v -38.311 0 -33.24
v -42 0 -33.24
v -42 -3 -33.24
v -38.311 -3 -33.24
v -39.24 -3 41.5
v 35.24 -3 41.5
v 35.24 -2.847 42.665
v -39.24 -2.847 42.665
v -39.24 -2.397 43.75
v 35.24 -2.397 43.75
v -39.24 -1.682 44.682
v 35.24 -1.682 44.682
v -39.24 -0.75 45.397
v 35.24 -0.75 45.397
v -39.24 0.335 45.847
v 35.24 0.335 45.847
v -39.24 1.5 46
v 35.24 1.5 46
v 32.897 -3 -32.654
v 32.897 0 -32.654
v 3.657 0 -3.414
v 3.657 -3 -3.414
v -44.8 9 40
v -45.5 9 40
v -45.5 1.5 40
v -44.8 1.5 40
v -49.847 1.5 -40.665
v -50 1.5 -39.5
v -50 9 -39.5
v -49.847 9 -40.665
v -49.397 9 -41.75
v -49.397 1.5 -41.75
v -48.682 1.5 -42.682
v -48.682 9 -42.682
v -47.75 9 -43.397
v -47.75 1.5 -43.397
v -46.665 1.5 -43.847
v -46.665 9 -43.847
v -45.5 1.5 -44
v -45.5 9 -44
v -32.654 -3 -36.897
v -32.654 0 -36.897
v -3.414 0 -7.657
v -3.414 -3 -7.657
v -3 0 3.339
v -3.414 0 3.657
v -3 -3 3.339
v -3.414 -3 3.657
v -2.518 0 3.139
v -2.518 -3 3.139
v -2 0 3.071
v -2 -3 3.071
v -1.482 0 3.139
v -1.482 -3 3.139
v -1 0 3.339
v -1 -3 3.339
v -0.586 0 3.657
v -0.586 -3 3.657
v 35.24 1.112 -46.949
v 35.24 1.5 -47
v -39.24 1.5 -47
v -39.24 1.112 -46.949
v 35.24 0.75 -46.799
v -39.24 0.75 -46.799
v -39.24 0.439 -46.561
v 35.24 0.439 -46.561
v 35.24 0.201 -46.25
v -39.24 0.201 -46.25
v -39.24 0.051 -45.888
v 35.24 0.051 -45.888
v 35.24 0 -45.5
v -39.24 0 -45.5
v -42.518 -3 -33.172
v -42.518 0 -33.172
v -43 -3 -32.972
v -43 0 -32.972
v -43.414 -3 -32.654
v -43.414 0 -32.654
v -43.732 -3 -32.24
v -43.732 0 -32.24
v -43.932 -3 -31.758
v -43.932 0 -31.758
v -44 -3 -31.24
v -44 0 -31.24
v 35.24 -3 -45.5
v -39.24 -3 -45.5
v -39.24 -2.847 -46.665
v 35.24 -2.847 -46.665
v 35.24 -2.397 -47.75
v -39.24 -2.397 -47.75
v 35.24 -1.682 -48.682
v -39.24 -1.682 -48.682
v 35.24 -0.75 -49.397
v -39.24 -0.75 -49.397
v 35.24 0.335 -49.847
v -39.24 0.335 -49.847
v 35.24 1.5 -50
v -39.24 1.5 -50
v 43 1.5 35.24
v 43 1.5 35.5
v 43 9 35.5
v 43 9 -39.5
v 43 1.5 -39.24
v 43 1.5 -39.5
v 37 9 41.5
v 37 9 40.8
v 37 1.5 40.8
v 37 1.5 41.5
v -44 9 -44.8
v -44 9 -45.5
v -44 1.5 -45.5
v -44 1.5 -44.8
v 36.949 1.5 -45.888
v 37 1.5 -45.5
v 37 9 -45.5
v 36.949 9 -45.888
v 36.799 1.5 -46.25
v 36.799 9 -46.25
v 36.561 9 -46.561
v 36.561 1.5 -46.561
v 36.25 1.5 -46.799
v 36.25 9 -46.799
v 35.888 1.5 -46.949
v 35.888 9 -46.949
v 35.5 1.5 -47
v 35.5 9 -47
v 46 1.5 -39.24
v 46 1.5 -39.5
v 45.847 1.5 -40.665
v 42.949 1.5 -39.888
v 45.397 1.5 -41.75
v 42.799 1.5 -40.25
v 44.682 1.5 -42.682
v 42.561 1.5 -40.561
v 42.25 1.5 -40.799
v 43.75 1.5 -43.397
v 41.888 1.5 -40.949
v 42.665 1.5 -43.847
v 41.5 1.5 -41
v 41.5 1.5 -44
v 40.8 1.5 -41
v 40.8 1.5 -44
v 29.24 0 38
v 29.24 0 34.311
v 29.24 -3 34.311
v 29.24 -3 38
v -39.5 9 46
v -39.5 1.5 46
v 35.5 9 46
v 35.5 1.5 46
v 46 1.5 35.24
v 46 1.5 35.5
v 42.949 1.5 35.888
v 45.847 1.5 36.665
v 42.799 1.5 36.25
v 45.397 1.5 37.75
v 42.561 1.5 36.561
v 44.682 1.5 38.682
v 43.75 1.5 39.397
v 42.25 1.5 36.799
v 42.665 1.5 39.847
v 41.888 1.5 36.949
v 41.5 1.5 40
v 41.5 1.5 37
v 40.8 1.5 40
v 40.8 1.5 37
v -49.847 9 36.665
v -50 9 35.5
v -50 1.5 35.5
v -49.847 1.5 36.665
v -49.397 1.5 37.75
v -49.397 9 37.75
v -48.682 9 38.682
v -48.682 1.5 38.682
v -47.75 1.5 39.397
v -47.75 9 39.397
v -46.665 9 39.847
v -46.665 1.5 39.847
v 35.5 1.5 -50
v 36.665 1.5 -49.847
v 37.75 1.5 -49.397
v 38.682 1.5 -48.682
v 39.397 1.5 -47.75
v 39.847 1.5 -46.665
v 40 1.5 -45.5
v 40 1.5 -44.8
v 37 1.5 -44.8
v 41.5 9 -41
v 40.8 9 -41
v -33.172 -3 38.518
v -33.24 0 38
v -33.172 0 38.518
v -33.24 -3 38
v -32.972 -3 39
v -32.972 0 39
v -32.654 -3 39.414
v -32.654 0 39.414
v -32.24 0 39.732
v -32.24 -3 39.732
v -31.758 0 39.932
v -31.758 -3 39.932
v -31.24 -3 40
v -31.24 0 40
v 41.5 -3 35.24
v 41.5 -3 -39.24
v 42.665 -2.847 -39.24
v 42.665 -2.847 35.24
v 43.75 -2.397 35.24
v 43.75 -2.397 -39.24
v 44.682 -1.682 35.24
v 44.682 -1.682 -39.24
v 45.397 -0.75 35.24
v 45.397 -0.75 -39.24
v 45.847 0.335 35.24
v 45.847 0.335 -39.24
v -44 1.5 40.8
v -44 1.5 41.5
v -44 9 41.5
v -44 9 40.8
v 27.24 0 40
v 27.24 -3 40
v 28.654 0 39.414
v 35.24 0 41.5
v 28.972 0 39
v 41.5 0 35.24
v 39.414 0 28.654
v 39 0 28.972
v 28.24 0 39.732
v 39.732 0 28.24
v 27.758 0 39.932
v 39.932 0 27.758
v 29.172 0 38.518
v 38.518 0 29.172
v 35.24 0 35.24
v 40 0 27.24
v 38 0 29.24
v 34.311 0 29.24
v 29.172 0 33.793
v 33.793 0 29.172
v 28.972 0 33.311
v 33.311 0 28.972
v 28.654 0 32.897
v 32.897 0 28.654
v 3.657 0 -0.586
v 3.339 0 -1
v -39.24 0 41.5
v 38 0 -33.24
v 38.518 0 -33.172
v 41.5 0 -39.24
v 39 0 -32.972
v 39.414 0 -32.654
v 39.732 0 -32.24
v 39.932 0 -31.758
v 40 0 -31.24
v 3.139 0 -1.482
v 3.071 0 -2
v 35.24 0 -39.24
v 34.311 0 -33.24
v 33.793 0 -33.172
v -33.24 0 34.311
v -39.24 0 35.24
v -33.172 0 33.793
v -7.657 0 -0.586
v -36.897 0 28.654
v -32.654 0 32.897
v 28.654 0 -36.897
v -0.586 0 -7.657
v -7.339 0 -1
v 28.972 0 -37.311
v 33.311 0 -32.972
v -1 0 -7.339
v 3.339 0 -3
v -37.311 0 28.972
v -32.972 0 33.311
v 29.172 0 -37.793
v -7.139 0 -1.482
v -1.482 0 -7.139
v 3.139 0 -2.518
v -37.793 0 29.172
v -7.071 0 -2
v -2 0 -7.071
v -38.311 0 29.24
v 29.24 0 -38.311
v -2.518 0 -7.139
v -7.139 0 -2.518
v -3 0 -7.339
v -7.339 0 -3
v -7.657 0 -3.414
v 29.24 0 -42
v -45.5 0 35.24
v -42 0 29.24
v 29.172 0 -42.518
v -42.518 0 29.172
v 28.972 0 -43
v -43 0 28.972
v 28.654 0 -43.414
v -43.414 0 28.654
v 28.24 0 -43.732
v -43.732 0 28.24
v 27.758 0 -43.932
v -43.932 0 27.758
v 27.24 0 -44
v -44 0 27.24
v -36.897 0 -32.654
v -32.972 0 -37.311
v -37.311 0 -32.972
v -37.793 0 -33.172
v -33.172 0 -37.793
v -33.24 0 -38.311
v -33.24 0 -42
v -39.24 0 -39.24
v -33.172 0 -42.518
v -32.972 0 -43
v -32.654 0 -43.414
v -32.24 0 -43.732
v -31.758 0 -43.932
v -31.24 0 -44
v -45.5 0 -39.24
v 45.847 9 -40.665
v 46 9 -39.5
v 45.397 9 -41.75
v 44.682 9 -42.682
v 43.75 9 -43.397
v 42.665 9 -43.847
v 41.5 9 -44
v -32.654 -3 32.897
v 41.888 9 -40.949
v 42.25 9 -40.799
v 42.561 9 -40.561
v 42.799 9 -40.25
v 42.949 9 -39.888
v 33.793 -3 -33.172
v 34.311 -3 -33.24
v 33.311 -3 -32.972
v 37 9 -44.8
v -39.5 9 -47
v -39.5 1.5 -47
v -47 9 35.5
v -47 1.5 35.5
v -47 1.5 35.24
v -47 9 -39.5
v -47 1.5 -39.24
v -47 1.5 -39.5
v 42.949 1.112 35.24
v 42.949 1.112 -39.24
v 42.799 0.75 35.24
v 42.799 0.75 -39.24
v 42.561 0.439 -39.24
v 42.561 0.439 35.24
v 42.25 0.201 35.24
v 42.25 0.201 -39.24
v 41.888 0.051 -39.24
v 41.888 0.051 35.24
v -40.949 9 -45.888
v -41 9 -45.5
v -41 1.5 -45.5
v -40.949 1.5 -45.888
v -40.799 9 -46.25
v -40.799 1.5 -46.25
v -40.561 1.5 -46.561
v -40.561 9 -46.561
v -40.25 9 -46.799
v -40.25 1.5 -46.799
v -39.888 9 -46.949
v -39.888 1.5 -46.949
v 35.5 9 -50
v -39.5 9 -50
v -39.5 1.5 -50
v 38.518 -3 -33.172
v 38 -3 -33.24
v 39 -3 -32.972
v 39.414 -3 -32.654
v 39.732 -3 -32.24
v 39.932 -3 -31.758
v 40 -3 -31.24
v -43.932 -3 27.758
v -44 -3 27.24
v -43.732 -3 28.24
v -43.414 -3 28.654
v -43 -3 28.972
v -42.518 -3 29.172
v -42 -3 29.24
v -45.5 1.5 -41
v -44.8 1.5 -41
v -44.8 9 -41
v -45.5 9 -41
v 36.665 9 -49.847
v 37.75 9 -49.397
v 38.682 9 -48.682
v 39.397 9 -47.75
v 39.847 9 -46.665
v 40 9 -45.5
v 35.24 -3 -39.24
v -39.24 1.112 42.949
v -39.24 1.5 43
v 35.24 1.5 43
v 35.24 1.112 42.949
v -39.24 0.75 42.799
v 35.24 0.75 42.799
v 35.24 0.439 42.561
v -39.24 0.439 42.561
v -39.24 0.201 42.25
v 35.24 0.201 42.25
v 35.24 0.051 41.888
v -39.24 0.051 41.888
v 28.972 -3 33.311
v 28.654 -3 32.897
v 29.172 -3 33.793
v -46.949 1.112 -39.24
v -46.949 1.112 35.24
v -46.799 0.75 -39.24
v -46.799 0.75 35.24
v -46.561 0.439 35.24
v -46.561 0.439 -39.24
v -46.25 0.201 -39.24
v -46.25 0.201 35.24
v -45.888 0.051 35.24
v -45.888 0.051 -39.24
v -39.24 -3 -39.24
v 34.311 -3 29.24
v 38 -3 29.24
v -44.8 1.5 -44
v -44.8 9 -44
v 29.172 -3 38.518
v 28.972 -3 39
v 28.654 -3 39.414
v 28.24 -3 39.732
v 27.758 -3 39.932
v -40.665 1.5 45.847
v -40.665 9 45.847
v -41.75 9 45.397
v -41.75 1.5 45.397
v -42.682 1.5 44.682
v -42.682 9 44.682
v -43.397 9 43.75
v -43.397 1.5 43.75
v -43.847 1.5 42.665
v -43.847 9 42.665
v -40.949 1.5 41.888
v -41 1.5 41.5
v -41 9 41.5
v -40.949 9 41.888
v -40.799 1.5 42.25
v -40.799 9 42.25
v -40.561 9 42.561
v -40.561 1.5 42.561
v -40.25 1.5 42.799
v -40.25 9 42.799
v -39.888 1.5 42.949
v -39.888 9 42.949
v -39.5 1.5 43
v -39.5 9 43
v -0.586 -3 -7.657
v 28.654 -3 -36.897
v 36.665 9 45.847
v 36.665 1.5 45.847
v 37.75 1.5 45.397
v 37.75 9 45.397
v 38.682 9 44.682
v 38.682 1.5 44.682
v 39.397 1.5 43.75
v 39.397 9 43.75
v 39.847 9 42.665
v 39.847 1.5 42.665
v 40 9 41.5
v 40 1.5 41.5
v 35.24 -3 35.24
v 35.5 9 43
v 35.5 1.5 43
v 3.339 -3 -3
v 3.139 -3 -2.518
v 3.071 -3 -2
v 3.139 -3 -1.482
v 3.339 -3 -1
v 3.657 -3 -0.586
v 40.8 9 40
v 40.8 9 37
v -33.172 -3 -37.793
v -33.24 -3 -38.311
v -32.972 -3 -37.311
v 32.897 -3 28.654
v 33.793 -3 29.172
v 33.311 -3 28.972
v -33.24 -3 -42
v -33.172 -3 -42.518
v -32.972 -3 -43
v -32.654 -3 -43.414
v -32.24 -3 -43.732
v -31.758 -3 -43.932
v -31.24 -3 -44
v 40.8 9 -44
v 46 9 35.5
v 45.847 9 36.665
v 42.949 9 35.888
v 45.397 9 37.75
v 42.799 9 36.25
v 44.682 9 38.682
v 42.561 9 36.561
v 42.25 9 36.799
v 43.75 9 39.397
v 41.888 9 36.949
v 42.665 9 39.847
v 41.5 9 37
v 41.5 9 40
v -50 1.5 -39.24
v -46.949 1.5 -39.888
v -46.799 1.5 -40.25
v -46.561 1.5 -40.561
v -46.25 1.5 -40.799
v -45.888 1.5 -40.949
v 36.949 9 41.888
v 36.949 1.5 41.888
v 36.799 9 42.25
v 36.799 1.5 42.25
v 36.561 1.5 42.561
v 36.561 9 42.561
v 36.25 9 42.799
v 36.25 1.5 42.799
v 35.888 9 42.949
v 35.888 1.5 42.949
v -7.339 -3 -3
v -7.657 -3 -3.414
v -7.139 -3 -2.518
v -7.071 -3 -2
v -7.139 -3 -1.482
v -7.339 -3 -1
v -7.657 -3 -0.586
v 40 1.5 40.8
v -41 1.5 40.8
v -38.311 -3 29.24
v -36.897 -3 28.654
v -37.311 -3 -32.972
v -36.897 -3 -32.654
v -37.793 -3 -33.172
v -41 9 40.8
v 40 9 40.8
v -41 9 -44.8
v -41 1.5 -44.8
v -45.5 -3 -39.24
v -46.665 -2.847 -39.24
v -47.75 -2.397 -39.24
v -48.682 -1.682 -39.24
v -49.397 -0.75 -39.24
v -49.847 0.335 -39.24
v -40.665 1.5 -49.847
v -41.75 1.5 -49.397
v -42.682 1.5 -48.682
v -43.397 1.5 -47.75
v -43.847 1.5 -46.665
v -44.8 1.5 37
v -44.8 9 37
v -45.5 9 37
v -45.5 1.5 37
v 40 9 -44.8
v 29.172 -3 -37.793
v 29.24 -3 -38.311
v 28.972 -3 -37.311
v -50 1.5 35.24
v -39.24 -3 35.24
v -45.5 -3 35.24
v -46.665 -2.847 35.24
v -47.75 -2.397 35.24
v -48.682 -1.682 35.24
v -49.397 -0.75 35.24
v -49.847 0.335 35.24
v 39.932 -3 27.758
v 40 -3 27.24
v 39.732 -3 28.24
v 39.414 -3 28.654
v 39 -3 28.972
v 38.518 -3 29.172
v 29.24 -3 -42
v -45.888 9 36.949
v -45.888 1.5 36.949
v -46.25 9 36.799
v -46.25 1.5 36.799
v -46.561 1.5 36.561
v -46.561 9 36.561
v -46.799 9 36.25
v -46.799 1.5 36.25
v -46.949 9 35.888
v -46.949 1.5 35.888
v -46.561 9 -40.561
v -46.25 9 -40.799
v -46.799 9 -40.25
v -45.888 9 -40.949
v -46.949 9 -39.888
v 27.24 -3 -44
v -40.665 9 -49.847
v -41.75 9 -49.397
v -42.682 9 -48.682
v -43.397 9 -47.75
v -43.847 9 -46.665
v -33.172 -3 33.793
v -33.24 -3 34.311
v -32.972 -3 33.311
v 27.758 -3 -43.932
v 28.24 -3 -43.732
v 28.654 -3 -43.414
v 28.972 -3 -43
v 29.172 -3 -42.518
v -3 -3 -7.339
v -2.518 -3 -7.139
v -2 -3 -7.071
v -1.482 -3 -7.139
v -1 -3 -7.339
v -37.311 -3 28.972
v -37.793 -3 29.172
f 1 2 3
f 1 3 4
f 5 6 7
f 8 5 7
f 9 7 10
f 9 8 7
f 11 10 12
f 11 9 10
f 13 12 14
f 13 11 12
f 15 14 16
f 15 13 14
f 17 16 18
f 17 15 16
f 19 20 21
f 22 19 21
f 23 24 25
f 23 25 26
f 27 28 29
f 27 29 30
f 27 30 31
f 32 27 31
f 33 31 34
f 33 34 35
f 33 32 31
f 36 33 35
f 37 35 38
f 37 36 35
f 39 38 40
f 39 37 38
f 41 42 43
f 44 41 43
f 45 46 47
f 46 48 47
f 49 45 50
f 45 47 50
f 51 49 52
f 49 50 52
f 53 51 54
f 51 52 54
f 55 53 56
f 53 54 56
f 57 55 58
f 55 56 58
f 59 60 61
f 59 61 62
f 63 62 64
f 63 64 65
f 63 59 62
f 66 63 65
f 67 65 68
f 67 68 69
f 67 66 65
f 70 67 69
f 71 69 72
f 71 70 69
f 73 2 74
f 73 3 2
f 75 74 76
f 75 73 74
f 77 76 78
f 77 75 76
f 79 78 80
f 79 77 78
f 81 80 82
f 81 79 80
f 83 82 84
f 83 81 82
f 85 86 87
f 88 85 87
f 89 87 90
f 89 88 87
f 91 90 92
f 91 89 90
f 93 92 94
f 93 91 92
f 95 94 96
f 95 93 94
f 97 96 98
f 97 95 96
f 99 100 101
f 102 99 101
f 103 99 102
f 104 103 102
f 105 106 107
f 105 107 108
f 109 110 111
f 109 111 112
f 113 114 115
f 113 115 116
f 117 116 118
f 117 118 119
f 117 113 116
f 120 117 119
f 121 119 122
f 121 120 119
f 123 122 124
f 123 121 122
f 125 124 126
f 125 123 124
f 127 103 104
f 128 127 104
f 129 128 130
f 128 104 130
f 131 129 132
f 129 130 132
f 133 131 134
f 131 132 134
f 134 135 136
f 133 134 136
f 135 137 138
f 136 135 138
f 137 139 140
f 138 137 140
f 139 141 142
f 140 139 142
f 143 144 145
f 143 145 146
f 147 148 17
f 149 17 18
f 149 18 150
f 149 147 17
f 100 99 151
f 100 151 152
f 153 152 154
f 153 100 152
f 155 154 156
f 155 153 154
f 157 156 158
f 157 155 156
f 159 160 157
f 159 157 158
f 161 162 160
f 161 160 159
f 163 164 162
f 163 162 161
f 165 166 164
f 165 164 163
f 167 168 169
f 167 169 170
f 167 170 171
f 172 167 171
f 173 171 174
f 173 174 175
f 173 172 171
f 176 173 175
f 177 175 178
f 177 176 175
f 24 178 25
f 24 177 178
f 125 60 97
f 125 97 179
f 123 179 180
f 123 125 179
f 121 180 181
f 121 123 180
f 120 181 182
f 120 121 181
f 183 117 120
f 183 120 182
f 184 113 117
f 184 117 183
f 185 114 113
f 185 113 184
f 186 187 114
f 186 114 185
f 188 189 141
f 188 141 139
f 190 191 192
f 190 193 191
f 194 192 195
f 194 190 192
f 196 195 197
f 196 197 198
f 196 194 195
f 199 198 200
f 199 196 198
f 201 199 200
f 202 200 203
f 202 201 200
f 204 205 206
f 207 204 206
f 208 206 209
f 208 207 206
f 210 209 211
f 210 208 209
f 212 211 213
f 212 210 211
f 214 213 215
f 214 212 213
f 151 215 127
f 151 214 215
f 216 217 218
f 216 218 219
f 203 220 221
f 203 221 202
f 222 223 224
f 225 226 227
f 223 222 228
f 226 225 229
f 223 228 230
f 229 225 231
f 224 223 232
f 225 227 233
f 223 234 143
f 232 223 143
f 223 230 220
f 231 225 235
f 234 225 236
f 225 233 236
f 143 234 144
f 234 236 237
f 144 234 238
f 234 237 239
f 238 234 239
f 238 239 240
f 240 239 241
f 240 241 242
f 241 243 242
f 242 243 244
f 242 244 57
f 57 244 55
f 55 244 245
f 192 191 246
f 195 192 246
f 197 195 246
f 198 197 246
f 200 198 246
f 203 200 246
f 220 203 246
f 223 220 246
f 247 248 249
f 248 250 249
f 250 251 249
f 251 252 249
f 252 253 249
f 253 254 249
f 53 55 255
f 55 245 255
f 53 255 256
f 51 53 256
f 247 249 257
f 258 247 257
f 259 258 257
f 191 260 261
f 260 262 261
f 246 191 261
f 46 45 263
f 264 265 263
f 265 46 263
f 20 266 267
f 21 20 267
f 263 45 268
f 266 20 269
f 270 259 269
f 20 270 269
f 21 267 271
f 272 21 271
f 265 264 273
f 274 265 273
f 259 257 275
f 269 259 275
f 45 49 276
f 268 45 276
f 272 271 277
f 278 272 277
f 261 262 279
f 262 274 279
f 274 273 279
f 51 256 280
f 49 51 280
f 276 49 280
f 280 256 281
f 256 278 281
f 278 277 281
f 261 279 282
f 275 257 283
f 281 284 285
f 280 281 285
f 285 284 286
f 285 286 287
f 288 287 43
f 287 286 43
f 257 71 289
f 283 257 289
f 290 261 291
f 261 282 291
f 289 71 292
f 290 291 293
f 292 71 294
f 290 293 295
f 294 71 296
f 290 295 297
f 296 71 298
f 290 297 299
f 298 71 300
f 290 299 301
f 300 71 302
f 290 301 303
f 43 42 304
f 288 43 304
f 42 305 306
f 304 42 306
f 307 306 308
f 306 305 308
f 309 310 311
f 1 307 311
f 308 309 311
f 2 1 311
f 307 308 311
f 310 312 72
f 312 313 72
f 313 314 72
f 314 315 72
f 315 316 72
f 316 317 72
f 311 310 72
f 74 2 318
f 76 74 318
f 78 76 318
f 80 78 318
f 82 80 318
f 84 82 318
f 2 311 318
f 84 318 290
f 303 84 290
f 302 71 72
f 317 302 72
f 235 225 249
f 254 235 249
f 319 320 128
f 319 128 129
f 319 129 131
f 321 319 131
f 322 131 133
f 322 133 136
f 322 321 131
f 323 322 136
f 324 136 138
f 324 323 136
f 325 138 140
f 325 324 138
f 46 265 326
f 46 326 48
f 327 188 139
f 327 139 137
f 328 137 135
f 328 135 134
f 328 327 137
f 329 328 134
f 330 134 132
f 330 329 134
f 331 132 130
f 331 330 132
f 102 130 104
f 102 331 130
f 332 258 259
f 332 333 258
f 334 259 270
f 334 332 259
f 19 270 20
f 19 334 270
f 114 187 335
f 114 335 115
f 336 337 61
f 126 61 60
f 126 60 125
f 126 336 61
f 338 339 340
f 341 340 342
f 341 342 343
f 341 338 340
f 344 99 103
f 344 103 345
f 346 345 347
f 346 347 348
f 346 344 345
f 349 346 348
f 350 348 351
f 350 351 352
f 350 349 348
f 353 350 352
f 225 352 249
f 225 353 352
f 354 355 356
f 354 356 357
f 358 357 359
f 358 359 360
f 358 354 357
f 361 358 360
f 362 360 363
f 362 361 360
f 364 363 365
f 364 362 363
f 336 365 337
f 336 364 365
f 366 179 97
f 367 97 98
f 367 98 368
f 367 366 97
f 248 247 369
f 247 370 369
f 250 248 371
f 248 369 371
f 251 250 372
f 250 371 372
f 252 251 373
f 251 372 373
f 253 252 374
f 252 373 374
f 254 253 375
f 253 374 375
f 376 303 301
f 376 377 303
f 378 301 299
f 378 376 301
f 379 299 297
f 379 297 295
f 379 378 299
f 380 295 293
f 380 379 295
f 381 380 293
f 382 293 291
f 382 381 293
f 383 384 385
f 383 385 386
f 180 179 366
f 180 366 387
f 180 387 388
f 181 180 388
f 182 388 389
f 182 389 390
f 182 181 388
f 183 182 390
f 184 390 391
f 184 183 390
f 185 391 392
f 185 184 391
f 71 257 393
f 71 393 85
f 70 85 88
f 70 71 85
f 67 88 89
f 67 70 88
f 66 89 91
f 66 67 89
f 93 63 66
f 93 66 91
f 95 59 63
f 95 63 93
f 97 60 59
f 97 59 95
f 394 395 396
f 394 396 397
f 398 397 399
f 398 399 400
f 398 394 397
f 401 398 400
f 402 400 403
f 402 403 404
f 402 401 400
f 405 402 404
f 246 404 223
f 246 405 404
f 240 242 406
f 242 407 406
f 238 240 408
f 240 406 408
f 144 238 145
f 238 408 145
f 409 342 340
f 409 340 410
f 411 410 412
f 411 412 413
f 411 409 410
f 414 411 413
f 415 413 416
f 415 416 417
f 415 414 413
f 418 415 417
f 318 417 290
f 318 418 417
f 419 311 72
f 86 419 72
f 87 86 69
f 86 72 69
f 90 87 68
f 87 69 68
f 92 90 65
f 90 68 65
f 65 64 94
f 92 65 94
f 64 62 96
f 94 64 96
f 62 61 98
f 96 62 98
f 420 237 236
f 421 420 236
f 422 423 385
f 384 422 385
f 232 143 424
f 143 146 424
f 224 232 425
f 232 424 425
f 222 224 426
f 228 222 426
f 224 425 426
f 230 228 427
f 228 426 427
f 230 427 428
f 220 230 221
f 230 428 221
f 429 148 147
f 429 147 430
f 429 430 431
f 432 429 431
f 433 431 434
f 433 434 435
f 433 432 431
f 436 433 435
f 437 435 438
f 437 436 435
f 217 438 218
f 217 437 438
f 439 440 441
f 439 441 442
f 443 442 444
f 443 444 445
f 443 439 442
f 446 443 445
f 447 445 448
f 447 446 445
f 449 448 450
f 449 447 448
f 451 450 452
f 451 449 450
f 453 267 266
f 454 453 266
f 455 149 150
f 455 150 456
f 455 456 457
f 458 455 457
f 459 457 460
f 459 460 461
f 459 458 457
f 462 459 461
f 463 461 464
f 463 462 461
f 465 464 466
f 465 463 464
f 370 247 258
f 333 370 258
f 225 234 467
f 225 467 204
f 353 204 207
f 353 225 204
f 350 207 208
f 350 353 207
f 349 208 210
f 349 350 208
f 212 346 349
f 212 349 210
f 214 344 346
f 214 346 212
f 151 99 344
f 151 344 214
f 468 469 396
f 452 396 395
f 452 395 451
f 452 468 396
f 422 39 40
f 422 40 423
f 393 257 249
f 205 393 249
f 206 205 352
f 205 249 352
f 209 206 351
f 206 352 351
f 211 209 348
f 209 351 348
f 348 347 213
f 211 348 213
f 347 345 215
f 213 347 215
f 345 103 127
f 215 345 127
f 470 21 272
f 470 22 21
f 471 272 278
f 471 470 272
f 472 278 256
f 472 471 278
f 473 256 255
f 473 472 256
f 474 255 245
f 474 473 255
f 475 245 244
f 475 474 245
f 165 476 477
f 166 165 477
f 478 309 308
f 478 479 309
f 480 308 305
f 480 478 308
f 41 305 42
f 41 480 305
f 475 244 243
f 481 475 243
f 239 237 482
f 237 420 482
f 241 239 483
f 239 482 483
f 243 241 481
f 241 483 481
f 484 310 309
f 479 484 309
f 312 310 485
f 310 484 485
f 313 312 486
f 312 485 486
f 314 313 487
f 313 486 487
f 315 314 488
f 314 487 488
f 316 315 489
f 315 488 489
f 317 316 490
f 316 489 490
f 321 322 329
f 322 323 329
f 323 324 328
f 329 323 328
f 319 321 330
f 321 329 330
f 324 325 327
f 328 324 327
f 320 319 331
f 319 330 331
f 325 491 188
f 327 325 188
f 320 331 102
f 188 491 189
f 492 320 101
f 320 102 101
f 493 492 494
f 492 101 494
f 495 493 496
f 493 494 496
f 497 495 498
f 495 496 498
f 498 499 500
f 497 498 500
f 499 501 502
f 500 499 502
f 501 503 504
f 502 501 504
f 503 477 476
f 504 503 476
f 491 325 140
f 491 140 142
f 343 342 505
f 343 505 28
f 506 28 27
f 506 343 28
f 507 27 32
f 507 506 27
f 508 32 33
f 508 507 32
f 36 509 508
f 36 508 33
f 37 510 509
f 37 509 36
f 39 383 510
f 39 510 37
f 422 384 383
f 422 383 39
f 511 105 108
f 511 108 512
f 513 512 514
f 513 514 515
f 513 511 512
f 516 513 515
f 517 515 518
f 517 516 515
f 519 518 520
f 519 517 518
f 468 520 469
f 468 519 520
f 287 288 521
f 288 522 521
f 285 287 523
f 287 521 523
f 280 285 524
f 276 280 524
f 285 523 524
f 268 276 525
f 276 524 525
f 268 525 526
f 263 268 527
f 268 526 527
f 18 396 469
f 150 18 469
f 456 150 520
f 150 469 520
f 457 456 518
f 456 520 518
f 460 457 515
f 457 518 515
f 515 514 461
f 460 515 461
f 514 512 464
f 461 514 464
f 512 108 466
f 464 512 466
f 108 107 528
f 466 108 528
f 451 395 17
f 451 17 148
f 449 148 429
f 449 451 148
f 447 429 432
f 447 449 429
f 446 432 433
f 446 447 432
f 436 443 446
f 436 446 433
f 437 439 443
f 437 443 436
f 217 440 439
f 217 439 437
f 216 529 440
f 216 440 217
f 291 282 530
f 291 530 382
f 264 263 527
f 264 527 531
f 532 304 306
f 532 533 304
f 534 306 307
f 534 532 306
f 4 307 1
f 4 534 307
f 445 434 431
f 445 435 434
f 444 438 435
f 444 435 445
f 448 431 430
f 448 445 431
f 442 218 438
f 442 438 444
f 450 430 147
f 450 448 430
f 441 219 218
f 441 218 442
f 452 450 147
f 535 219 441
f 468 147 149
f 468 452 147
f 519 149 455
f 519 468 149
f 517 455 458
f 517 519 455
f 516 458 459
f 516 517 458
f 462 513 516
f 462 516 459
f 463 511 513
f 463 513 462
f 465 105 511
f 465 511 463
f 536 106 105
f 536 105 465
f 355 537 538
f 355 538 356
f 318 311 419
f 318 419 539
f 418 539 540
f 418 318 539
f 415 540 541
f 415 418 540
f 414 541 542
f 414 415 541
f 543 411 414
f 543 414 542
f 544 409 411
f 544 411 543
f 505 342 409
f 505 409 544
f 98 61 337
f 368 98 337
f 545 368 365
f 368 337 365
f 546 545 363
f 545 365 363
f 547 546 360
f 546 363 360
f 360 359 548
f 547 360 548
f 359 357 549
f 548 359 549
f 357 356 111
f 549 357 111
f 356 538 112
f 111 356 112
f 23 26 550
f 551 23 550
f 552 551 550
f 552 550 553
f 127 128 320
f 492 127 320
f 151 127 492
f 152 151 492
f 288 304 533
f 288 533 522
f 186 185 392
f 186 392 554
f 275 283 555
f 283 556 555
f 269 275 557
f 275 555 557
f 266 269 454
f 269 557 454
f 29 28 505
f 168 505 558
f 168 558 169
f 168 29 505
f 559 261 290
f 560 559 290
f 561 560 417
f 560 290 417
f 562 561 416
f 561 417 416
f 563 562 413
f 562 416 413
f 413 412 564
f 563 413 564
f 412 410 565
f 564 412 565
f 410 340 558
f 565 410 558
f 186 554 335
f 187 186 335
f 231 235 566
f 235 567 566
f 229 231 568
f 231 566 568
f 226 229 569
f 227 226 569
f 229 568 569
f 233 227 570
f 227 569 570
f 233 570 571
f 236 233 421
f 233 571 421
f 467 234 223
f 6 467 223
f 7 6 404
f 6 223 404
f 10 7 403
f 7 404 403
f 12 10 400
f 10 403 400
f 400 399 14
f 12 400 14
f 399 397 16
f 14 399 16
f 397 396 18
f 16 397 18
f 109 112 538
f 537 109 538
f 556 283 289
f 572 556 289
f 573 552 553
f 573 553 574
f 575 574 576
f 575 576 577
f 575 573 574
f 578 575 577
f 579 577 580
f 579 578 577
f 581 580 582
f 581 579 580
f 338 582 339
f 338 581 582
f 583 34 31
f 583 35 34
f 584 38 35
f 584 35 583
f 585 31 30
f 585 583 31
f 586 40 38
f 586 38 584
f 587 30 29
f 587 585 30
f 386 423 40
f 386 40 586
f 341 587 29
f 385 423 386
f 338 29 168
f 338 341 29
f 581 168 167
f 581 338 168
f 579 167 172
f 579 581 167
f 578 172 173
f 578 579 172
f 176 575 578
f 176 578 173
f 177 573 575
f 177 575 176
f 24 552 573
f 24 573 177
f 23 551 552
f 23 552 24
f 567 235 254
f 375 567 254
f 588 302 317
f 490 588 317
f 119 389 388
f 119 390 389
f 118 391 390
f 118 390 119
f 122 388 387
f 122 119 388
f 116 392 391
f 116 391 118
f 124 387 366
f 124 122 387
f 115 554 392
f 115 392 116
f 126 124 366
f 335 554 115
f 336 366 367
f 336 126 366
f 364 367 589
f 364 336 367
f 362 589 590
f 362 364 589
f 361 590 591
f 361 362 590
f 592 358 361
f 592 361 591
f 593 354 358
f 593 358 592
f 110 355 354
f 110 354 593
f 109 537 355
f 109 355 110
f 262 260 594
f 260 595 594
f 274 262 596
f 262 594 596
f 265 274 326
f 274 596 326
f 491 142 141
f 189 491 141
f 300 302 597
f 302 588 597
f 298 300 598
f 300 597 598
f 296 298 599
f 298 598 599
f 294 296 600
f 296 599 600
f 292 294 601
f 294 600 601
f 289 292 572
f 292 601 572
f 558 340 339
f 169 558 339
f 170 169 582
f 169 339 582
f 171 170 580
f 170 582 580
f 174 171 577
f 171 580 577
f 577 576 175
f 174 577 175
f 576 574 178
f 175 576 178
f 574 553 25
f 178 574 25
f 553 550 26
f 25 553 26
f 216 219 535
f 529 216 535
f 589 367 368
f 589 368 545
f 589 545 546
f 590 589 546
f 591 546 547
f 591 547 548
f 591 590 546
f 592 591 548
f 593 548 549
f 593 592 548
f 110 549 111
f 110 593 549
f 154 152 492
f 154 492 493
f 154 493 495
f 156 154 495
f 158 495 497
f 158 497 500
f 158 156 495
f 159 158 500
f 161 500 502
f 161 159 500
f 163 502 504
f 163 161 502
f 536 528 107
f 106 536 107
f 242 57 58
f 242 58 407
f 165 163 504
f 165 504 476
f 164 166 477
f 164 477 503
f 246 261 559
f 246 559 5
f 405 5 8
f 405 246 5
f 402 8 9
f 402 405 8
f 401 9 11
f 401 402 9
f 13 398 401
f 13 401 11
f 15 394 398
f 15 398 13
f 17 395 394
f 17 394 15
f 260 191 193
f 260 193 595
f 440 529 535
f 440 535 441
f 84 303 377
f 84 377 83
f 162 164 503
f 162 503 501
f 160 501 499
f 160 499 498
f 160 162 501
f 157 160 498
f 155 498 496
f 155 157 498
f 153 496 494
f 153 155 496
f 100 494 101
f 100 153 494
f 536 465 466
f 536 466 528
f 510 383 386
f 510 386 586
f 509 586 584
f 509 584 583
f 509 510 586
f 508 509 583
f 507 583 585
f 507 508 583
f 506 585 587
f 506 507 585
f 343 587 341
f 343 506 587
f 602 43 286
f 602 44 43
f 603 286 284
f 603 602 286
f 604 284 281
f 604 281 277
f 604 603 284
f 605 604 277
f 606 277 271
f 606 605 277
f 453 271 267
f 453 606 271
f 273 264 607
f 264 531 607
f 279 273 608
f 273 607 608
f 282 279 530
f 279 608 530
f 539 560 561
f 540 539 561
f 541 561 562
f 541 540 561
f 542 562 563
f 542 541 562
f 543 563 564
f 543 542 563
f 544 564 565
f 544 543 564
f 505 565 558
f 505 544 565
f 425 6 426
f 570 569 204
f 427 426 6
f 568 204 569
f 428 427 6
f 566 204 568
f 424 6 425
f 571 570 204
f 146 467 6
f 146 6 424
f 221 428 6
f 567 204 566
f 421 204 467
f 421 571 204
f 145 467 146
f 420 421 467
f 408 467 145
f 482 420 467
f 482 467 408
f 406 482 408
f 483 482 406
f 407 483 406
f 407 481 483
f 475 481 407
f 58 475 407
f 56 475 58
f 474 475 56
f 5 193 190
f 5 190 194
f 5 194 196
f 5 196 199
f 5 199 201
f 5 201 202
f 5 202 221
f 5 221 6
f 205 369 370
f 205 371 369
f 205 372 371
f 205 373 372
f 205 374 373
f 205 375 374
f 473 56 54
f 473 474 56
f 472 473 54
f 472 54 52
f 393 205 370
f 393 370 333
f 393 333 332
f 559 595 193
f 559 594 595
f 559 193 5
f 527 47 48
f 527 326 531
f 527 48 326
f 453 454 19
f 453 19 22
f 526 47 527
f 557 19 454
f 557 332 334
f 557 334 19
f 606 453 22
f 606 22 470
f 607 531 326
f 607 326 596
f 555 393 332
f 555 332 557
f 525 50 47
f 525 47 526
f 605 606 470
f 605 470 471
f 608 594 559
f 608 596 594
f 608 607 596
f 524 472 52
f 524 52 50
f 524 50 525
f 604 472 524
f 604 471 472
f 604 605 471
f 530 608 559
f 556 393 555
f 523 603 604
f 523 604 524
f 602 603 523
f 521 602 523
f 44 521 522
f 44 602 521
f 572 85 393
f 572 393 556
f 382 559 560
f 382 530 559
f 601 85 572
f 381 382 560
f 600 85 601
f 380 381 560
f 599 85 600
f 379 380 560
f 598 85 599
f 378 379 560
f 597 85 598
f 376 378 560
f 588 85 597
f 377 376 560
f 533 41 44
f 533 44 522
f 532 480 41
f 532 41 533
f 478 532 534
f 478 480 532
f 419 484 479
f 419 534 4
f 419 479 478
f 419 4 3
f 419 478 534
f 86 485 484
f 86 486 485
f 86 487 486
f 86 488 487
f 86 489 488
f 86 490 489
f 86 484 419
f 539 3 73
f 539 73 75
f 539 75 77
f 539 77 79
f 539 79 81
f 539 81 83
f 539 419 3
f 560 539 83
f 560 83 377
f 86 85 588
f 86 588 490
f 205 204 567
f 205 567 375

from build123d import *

# Parameters (mm, degrees)
BASE_FLANGE1_DEPTH             = 3
FILLET1_R                      = 2
EDGE_FLANGE1_STRIP_W           = 15
EDGE_FLANGE1_STRIP_H           = 3
EDGE_FLANGE1_STRIP_CUT_DEPTH   = 74.48
EDGE_FLANGE1_STRIP_2_W         = 15
EDGE_FLANGE1_STRIP_2_H         = 3
EDGE_FLANGE1_STRIP_CUT_2_DEPTH = 74.48
EDGE_FLANGE1_STRIP_3_W         = 15
EDGE_FLANGE1_STRIP_3_H         = 3
EDGE_FLANGE1_STRIP_CUT_3_DEPTH = 74.48
EDGE_FLANGE1_STRIP_4_W         = 15
EDGE_FLANGE1_STRIP_4_H         = 3
EDGE_FLANGE1_STRIP_CUT_4_DEPTH = 74.48
EDGE_FLANGE1_DEPTH             = 74.48
EDGE_FLANGE1_BEND_DEPTH        = 74.48
EDGE_FLANGE1_BEND_2_DEPTH      = 74.48
EDGE_FLANGE1_BEND_3_DEPTH      = 74.48
EDGE_FLANGE2_DEPTH             = 7.5
EDGE_FLANGE2_BEND_DEPTH        = 7.5
EDGE_FLANGE2_BEND_2_DEPTH      = 7.5
EDGE_FLANGE2_BEND_3_DEPTH      = 7.5
EDGE_FLANGE2_BEND_4_DEPTH      = 7.5
EDGE_FLANGE2_BEND_5_DEPTH      = 7.5
EDGE_FLANGE2_BEND_6_DEPTH      = 7.5
EDGE_FLANGE2_BEND_7_DEPTH      = 7.5


# Sheet-metal steps are written as plain solids
with BuildPart() as part:
    # Sketch1 → Base-Flange1 (new body)
    with BuildSketch(Plane(origin=(0, 0, 0), x_dir=(1, 0, 0), z_dir=(0, 1, 0))):
        Polygon((-50, 39.24), (-39.24, 39.24), (-39.24, 50), (35.24, 50), (35.24, 39.24), (46, 39.24), (46, -35.24), (35.24, -35.24), (35.24, -46), (-39.24, -46), (-39.24, -35.24), (-50, -35.24), align=None)
        Polygon((-37.482640687, 33.24), (-6.242640687, 2), (-37.482640687, -29.24), (-44, -29.24), (-44, 33.24), align=None, mode=Mode.SUBTRACT)
        Polygon((-33.24, 37.482640687), (-2, 6.242640687), (29.24, 37.482640687), (29.24, 44), (-33.24, 44), align=None, mode=Mode.SUBTRACT)
        Polygon((33.482640687, 33.24), (2.242640687, 2), (33.482640687, -29.24), (40, -29.24), (40, 33.24), align=None, mode=Mode.SUBTRACT)
        Polygon((-33.24, -40), (-33.24, -33.482640687), (-2, -2.242640687), (29.24, -33.482640687), (29.24, -40), align=None, mode=Mode.SUBTRACT)
    extrude(amount=-BASE_FLANGE1_DEPTH)

    # Fillet1
    fillet1_edges = [part.edges().sort_by_distance(p)[0] for p in [
        (29.24, -1.5, -44),
        (29.24, -1.5, -37.482640687),
        (-2, -1.5, -6.242640687),
        (-33.24, -1.5, -37.482640687),
        (-33.24, -1.5, -44),
        (-44, -1.5, 29.24),
        (-44, -1.5, -33.24),
        (-37.482640687, -1.5, -33.24),
        (-6.242640687, -1.5, -2),
        (-37.482640687, -1.5, 29.24),
        (29.24, -1.5, 40),
        (-33.24, -1.5, 40),
        (-33.24, -1.5, 33.482640687),
        (-2, -1.5, 2.242640687),
        (29.24, -1.5, 33.482640687),
        (40, -1.5, -33.24),
        (40, -1.5, 29.24),
        (33.482640687, -1.5, 29.24),
        (2.242640687, -1.5, -2),
        (33.482640687, -1.5, -33.24),
    ]]
    fillet(fillet1_edges, radius=FILLET1_R)

    # Edge-Flange1 strip (across the edge) → Edge-Flange1 strip cut (cut)
    with BuildSketch(Plane(origin=(-50, 0, -39.24), x_dir=(1, 0, 0), z_dir=(0, 0, 1))):
        with Locations((-3, -1.5)):
            Rectangle(EDGE_FLANGE1_STRIP_W, EDGE_FLANGE1_STRIP_H)
    extrude(amount=EDGE_FLANGE1_STRIP_CUT_DEPTH, mode=Mode.SUBTRACT)

    # Edge-Flange1 strip 2 (across the edge) → Edge-Flange1 strip cut 2 (cut)
    with BuildSketch(Plane(origin=(46, 0, 35.24), x_dir=(-1, 0, 0), z_dir=(0, 0, -1))):
        with Locations((-3, -1.5)):
            Rectangle(EDGE_FLANGE1_STRIP_2_W, EDGE_FLANGE1_STRIP_2_H)
    extrude(amount=EDGE_FLANGE1_STRIP_CUT_2_DEPTH, mode=Mode.SUBTRACT)

    # Edge-Flange1 strip 3 (across the edge) → Edge-Flange1 strip cut 3 (cut)
    with BuildSketch(Plane(origin=(-39.24, 0, 46), x_dir=(0, 0, -1), z_dir=(1, 0, 0))):
        with Locations((-3, -1.5)):
            Rectangle(EDGE_FLANGE1_STRIP_3_W, EDGE_FLANGE1_STRIP_3_H)
    extrude(amount=EDGE_FLANGE1_STRIP_CUT_3_DEPTH, mode=Mode.SUBTRACT)

    # Edge-Flange1 strip 4 (across the edge) → Edge-Flange1 strip cut 4 (cut)
    with BuildSketch(Plane(origin=(35.24, 0, -50), x_dir=(0, 0, 1), z_dir=(-1, 0, 0))):
        with Locations((-3, -1.5)):
            Rectangle(EDGE_FLANGE1_STRIP_4_W, EDGE_FLANGE1_STRIP_4_H)
    extrude(amount=EDGE_FLANGE1_STRIP_CUT_4_DEPTH, mode=Mode.SUBTRACT)

    # Edge-Flange1 section (across the edge) → Edge-Flange1 (add)
    with BuildSketch(Plane(origin=(-50, 0, -39.24), x_dir=(1, 0, 0), z_dir=(0, 0, 1))):
        with BuildLine():
            Line((0, 1.5), (0, 9))
            Line((0, 9), (3, 9))
            Line((3, 9), (3, 1.5))
            ThreePointArc((3, 1.5), (3.439339828, 0.439339828), (4.5, 0))
            Line((4.5, 0), (4.5, -3))
            ThreePointArc((4.5, -3), (1.318019485, -1.681980515), (0, 1.5))
        make_face()
    extrude(amount=EDGE_FLANGE1_DEPTH)

    # Edge-Flange1 section 2 (across the edge) → Edge-Flange1 bend (add)
    with BuildSketch(Plane(origin=(46, 0, 35.24), x_dir=(-1, 0, 0), z_dir=(0, 0, -1))):
        with BuildLine():
            Line((0, 1.5), (0, 9))
            Line((0, 9), (3, 9))
            Line((3, 9), (3, 1.5))
            ThreePointArc((3, 1.5), (3.439339828, 0.439339828), (4.5, 0))
            Line((4.5, 0), (4.5, -3))
            ThreePointArc((4.5, -3), (1.318019485, -1.681980515), (0, 1.5))
        make_face()
    extrude(amount=EDGE_FLANGE1_BEND_DEPTH)

    # Edge-Flange1 section 3 (across the edge) → Edge-Flange1 bend 2 (add)
    with BuildSketch(Plane(origin=(-39.24, 0, 46), x_dir=(0, 0, -1), z_dir=(1, 0, 0))):
        with BuildLine():
            Line((0, 1.5), (0, 9))
            Line((0, 9), (3, 9))
            Line((3, 9), (3, 1.5))
            ThreePointArc((3, 1.5), (3.439339828, 0.439339828), (4.5, 0))
            Line((4.5, 0), (4.5, -3))
            ThreePointArc((4.5, -3), (1.318019485, -1.681980515), (0, 1.5))
        make_face()
    extrude(amount=EDGE_FLANGE1_BEND_2_DEPTH)

    # Edge-Flange1 section 4 (across the edge) → Edge-Flange1 bend 3 (add)
    with BuildSketch(Plane(origin=(35.24, 0, -50), x_dir=(0, 0, 1), z_dir=(-1, 0, 0))):
        with BuildLine():
            Line((0, 1.5), (0, 9))
            Line((0, 9), (3, 9))
            Line((3, 9), (3, 1.5))
            ThreePointArc((3, 1.5), (3.439339828, 0.439339828), (4.5, 0))
            Line((4.5, 0), (4.5, -3))
            ThreePointArc((4.5, -3), (1.318019485, -1.681980515), (0, 1.5))
        make_face()
    extrude(amount=EDGE_FLANGE1_BEND_3_DEPTH)

    # Edge-Flange2 section (across the edge) → Edge-Flange2 (add)
    with BuildSketch(Plane(origin=(43, 9, -41), x_dir=(0, 0, 1), z_dir=(0, -1, 0))):
        with BuildLine():
            Line((-3, 1.5), (-3, 2.2))
            Line((-3, 2.2), (0, 2.2))
            Line((0, 2.2), (0, 1.5))
            ThreePointArc((0, 1.5), (0.439339828, 0.439339828), (1.5, 0))
            Line((1.5, 0), (1.76, 0))
            Line((1.76, 0), (1.76, -3))
            Line((1.76, -3), (1.5, -3))
            ThreePointArc((1.5, -3), (-1.681980515, -1.681980515), (-3, 1.5))
        make_face()
    extrude(amount=EDGE_FLANGE2_DEPTH)

    # Edge-Flange2 section 2 (across the edge) → Edge-Flange2 bend (add)
    with BuildSketch(Plane(origin=(37, 1.5, -47), x_dir=(-1, 0, 0), z_dir=(0, 1, 0))):
        with BuildLine():
            Line((-3, 1.5), (-3, 2.2))
            Line((-3, 2.2), (0, 2.2))
            Line((0, 2.2), (0, 1.5))
            ThreePointArc((0, 1.5), (0.439339828, 0.439339828), (1.5, 0))
            Line((1.5, 0), (1.76, 0))
            Line((1.76, 0), (1.76, -3))
            Line((1.76, -3), (1.5, -3))
            ThreePointArc((1.5, -3), (-1.681980515, -1.681980515), (-3, 1.5))
        make_face()
    extrude(amount=EDGE_FLANGE2_BEND_DEPTH)

    # Edge-Flange2 section 3 (across the edge) → Edge-Flange2 bend 2 (add)
    with BuildSketch(Plane(origin=(-41, 9, -47), x_dir=(1, 0, 0), z_dir=(0, -1, 0))):
        with BuildLine():
            Line((-3, 1.5), (-3, 2.2))
            Line((-3, 2.2), (0, 2.2))
            Line((0, 2.2), (0, 1.5))
            ThreePointArc((0, 1.5), (0.439339828, 0.439339828), (1.5, 0))
            Line((1.5, 0), (1.76, 0))
            Line((1.76, 0), (1.76, -3))
            Line((1.76, -3), (1.5, -3))
            ThreePointArc((1.5, -3), (-1.681980515, -1.681980515), (-3, 1.5))
        make_face()
    extrude(amount=EDGE_FLANGE2_BEND_2_DEPTH)

    # Edge-Flange2 section 4 (across the edge) → Edge-Flange2 bend 3 (add)
    with BuildSketch(Plane(origin=(-47, 1.5, -41), x_dir=(0, 0, 1), z_dir=(0, 1, 0))):
        with BuildLine():
            Line((-3, 1.5), (-3, 2.2))
            Line((-3, 2.2), (0, 2.2))
            Line((0, 2.2), (0, 1.5))
            ThreePointArc((0, 1.5), (0.439339828, 0.439339828), (1.5, 0))
            Line((1.5, 0), (1.76, 0))
            Line((1.76, 0), (1.76, -3))
            Line((1.76, -3), (1.5, -3))
            ThreePointArc((1.5, -3), (-1.681980515, -1.681980515), (-3, 1.5))
        make_face()
    extrude(amount=EDGE_FLANGE2_BEND_3_DEPTH)

    # Edge-Flange2 section 5 (across the edge) → Edge-Flange2 bend 4 (add)
    with BuildSketch(Plane(origin=(-47, 9, 37), x_dir=(0, 0, -1), z_dir=(0, -1, 0))):
        with BuildLine():
            Line((-3, 1.5), (-3, 2.2))
            Line((-3, 2.2), (0, 2.2))
            Line((0, 2.2), (0, 1.5))
            ThreePointArc((0, 1.5), (0.439339828, 0.439339828), (1.5, 0))
            Line((1.5, 0), (1.76, 0))
            Line((1.76, 0), (1.76, -3))
            Line((1.76, -3), (1.5, -3))
            ThreePointArc((1.5, -3), (-1.681980515, -1.681980515), (-3, 1.5))
        make_face()
    extrude(amount=EDGE_FLANGE2_BEND_4_DEPTH)

    # Edge-Flange2 section 6 (across the edge) → Edge-Flange2 bend 5 (add)
    with BuildSketch(Plane(origin=(-41, 1.5, 43), x_dir=(1, 0, 0), z_dir=(0, 1, 0))):
        with BuildLine():
            Line((-3, 1.5), (-3, 2.2))
            Line((-3, 2.2), (0, 2.2))
            Line((0, 2.2), (0, 1.5))
            ThreePointArc((0, 1.5), (0.439339828, 0.439339828), (1.5, 0))
            Line((1.5, 0), (1.76, 0))
            Line((1.76, 0), (1.76, -3))
            Line((1.76, -3), (1.5, -3))
            ThreePointArc((1.5, -3), (-1.681980515, -1.681980515), (-3, 1.5))
        make_face()
    extrude(amount=EDGE_FLANGE2_BEND_5_DEPTH)

    # Edge-Flange2 section 7 (across the edge) → Edge-Flange2 bend 6 (add)
    with BuildSketch(Plane(origin=(37, 9, 43), x_dir=(-1, 0, 0), z_dir=(0, -1, 0))):
        with BuildLine():
            Line((-3, 1.5), (-3, 2.2))
            Line((-3, 2.2), (0, 2.2))
            Line((0, 2.2), (0, 1.5))
            ThreePointArc((0, 1.5), (0.439339828, 0.439339828), (1.5, 0))
            Line((1.5, 0), (1.76, 0))
            Line((1.76, 0), (1.76, -3))
            Line((1.76, -3), (1.5, -3))
            ThreePointArc((1.5, -3), (-1.681980515, -1.681980515), (-3, 1.5))
        make_face()
    extrude(amount=EDGE_FLANGE2_BEND_6_DEPTH)

    # Edge-Flange2 section 8 (across the edge) → Edge-Flange2 bend 7 (add)
    with BuildSketch(Plane(origin=(43, 1.5, 37), x_dir=(0, 0, -1), z_dir=(0, 1, 0))):
        with BuildLine():
            Line((-3, 1.5), (-3, 2.2))
            Line((-3, 2.2), (0, 2.2))
            Line((0, 2.2), (0, 1.5))
            ThreePointArc((0, 1.5), (0.439339828, 0.439339828), (1.5, 0))
            Line((1.5, 0), (1.76, 0))
            Line((1.76, 0), (1.76, -3))
            Line((1.76, -3), (1.5, -3))
            ThreePointArc((1.5, -3), (-1.681980515, -1.681980515), (-3, 1.5))
        make_face()
    extrude(amount=EDGE_FLANGE2_BEND_7_DEPTH)


solid = part.part
